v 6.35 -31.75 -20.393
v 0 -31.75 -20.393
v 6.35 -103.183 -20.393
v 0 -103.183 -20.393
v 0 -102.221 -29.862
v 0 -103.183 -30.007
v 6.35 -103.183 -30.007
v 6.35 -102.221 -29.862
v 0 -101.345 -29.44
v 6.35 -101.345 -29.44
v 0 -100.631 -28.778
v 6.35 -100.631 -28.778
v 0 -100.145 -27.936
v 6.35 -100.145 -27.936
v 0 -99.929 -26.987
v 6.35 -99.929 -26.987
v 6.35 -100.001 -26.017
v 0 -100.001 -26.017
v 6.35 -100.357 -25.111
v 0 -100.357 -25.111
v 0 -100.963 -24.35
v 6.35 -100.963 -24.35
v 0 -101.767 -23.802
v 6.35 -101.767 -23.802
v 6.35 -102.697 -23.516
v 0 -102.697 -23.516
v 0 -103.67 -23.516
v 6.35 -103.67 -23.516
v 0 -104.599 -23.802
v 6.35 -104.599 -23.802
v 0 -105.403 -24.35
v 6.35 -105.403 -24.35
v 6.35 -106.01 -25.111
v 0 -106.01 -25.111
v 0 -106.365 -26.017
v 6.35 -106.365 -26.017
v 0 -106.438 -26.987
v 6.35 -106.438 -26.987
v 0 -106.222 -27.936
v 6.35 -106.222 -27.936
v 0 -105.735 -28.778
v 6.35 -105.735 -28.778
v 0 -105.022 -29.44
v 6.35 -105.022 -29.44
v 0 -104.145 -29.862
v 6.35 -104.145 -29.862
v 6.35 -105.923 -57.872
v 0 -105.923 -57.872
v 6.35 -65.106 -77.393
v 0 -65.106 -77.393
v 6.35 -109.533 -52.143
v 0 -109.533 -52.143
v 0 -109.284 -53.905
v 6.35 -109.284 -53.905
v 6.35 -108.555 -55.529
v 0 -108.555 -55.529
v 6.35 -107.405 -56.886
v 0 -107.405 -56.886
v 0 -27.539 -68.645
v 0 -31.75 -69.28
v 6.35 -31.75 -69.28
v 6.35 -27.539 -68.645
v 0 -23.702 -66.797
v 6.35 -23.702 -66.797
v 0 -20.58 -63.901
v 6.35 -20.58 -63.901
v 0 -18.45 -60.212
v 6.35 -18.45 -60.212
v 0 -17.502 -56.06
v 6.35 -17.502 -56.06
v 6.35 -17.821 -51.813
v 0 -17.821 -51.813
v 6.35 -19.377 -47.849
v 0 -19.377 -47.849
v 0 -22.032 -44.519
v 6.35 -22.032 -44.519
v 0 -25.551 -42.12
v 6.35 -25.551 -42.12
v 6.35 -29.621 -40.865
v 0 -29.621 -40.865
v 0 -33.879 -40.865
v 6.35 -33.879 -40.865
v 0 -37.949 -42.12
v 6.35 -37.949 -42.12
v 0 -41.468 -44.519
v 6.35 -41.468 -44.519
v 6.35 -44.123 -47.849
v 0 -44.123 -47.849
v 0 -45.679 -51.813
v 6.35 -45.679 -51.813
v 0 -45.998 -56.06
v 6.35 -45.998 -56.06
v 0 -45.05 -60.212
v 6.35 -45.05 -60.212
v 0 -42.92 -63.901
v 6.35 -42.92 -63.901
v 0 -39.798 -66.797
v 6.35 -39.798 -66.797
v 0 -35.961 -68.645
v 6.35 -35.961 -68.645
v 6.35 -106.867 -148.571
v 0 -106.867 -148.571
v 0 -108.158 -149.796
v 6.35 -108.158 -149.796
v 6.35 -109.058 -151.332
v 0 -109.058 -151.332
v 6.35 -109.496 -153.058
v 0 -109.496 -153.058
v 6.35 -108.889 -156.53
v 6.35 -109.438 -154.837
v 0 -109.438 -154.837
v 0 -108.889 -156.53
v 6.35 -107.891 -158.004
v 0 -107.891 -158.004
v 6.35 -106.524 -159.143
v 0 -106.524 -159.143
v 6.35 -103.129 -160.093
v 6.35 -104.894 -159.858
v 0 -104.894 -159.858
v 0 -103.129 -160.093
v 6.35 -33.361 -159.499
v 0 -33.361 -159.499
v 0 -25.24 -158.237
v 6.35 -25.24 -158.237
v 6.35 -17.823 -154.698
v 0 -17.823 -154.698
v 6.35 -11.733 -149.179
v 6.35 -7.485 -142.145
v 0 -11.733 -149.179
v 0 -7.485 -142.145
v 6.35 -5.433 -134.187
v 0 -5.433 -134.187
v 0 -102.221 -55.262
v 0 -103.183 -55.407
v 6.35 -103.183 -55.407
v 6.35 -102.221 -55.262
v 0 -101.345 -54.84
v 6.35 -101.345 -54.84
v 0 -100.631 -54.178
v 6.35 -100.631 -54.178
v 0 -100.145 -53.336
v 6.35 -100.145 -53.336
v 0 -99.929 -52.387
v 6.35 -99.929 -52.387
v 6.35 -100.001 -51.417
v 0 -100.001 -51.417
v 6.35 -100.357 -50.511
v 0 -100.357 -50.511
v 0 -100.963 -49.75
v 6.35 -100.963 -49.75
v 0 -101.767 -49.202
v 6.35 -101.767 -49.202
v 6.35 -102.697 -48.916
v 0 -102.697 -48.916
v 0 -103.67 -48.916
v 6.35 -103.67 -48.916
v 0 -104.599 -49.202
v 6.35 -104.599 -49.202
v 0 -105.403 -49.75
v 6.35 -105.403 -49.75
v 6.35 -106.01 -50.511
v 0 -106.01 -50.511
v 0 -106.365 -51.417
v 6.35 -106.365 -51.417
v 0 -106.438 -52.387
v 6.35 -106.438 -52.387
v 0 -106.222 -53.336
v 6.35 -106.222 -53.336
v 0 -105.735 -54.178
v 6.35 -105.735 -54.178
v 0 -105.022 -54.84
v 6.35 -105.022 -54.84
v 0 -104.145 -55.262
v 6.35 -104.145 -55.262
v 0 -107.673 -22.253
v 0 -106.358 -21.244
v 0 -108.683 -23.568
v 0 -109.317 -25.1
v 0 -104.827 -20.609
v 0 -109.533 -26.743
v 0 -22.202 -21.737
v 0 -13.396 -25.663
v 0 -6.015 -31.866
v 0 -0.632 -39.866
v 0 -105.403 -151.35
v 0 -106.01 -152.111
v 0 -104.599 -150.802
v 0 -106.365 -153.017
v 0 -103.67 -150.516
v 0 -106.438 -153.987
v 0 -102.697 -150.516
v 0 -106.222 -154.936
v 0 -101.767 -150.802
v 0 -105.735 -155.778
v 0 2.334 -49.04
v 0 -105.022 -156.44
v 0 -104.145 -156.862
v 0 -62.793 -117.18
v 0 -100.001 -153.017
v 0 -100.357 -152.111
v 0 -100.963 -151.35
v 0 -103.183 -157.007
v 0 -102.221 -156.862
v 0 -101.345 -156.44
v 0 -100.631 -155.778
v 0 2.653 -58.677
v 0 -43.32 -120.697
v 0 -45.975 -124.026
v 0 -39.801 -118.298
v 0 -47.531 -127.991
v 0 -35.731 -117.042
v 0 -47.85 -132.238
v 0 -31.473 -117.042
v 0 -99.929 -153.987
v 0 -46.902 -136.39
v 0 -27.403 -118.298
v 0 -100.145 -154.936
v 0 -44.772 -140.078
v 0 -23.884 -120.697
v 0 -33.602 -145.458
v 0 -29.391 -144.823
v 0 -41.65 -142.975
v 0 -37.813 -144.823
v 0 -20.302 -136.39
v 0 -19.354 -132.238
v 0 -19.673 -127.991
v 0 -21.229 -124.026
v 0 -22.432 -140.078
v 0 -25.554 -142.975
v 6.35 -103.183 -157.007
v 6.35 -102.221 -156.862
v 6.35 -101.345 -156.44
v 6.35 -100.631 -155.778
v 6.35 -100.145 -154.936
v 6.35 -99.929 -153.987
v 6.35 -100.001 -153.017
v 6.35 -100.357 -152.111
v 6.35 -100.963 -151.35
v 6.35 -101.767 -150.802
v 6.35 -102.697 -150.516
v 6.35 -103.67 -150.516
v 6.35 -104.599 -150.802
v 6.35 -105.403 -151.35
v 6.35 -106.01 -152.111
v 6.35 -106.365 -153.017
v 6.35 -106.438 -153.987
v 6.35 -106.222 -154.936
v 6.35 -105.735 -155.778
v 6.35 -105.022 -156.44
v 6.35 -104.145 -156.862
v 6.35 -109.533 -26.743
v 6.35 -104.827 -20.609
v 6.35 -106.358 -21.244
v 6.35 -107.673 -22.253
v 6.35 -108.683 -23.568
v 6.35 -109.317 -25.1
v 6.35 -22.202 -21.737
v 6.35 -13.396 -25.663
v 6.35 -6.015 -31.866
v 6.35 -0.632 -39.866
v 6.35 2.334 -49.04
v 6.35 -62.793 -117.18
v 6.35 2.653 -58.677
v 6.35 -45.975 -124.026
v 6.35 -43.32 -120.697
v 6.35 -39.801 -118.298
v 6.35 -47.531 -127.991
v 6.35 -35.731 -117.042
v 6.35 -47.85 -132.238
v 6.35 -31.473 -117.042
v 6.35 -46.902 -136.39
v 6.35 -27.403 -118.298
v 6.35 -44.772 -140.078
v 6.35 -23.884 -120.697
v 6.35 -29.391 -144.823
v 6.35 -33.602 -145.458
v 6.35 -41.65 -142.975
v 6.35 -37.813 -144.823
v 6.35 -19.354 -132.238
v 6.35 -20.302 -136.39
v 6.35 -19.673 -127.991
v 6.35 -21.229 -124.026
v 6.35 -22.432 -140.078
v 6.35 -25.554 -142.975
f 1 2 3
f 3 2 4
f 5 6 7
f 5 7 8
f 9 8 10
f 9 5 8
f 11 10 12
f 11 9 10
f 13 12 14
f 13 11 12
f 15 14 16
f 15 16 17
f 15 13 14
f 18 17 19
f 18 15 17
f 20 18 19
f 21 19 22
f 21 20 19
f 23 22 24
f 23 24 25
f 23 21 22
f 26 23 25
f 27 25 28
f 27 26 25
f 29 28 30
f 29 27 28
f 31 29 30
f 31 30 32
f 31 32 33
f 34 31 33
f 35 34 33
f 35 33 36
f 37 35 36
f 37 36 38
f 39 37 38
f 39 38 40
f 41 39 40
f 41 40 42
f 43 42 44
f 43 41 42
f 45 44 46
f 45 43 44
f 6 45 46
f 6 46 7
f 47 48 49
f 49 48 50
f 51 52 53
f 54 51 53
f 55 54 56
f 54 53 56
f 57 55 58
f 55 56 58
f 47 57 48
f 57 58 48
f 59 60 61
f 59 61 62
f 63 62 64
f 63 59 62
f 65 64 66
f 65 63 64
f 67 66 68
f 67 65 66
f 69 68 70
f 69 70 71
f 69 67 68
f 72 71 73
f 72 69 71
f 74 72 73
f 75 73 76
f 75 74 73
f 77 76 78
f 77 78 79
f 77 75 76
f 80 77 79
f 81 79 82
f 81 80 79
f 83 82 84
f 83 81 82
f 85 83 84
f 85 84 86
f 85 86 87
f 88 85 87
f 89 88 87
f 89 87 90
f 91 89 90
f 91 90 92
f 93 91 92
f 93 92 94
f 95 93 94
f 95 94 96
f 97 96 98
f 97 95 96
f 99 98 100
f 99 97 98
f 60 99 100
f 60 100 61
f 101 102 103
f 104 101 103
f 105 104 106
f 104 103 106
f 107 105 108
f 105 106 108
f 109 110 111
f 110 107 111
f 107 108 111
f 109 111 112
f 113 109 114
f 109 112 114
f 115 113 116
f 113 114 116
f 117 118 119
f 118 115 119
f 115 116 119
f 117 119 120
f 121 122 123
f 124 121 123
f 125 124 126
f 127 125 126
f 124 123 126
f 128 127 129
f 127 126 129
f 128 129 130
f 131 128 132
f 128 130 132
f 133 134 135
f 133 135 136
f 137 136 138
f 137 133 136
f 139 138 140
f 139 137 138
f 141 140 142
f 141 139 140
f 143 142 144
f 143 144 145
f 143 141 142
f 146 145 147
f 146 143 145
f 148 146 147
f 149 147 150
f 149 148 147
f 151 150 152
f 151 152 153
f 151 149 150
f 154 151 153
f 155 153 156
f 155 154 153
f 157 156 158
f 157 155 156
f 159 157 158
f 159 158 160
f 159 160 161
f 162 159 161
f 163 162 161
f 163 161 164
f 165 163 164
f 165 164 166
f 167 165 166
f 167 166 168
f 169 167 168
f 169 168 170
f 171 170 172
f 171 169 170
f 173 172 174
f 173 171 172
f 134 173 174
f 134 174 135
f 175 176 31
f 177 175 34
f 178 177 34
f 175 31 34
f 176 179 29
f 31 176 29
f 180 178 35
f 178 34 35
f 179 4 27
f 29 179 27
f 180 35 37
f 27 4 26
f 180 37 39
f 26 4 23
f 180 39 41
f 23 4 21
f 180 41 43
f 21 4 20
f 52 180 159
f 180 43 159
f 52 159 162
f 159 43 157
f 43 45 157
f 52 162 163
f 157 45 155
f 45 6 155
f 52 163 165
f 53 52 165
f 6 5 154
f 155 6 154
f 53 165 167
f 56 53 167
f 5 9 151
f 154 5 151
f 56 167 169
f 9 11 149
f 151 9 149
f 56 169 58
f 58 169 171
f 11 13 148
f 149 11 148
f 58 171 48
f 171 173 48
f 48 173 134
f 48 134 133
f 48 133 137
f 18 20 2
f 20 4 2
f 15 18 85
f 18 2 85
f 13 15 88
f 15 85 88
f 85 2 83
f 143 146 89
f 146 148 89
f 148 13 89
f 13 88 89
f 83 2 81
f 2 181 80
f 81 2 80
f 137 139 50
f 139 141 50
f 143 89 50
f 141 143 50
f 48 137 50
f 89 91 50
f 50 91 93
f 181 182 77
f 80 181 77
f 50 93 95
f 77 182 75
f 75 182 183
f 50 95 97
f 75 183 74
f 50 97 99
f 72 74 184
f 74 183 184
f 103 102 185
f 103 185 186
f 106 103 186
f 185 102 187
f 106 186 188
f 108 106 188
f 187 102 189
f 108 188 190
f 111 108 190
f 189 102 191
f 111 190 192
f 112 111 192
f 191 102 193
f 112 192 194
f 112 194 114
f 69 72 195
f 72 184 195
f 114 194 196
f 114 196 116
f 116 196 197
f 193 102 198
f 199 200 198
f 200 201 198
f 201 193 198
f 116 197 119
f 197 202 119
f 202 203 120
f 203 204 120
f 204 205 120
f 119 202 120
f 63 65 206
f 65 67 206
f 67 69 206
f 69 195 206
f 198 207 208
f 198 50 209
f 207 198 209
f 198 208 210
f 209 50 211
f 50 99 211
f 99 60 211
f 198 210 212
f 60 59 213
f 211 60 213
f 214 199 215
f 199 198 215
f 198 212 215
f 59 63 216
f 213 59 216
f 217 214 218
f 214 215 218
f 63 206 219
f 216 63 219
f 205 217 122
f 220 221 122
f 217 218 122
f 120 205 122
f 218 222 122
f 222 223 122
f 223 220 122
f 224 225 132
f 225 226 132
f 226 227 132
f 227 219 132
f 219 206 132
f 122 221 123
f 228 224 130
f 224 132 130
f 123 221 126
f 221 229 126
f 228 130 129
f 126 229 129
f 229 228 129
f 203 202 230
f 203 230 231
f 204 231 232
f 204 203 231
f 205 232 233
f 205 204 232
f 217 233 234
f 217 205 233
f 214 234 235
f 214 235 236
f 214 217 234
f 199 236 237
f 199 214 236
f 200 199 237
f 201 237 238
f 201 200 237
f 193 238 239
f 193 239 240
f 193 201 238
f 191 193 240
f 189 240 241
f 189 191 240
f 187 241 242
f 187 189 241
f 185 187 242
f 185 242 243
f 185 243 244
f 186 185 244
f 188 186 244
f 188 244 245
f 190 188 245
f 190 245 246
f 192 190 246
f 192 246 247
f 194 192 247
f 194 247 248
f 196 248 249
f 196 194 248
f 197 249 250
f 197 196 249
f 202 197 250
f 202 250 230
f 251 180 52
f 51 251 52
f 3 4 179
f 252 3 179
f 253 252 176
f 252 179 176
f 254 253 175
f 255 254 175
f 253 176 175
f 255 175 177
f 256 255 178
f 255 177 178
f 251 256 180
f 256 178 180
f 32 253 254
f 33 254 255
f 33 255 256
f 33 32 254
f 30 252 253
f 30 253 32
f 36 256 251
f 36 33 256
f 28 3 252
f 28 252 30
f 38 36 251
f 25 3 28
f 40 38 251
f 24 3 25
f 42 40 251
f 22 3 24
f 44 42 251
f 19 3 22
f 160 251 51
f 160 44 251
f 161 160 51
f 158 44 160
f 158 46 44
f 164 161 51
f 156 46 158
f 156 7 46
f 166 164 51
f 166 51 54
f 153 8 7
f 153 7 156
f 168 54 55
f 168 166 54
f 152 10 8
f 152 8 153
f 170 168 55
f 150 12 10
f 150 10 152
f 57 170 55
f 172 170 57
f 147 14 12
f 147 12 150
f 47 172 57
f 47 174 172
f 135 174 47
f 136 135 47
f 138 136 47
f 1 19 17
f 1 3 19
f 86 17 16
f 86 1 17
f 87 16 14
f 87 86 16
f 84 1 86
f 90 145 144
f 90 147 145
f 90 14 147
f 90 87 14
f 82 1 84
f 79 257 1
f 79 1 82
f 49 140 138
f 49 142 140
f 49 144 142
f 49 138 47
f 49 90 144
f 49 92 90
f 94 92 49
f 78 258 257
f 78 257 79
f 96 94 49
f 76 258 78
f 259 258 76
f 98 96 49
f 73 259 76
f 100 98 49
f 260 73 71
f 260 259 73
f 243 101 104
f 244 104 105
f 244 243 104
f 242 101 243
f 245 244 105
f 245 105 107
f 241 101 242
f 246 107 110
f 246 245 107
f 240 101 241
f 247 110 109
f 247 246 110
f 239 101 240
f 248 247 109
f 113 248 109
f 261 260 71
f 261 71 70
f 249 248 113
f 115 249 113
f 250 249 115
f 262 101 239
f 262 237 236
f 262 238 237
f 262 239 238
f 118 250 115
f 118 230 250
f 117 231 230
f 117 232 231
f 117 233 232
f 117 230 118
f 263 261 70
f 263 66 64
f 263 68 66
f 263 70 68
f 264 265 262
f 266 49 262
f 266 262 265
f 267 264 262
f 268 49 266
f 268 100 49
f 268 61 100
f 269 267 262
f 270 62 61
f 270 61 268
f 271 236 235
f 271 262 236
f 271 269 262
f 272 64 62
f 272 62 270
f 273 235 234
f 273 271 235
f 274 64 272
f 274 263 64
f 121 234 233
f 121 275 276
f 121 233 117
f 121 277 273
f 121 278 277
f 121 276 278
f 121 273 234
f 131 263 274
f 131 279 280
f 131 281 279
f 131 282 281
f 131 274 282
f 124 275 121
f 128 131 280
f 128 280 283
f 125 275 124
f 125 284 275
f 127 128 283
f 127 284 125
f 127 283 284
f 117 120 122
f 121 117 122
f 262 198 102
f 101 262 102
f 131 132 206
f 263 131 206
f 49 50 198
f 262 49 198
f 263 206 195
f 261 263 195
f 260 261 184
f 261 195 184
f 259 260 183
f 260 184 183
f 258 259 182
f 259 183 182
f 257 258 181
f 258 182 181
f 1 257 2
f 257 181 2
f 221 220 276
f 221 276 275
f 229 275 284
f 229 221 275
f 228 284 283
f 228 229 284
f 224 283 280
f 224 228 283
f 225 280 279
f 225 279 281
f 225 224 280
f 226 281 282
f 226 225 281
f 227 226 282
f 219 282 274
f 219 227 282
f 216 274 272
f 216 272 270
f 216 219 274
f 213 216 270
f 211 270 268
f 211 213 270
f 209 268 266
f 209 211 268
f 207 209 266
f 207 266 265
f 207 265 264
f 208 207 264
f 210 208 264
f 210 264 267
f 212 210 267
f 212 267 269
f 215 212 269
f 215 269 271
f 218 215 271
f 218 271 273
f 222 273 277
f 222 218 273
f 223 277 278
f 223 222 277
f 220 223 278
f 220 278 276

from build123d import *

# Parameters (mm, degrees)
SKETCH2_R           = 34.599541738
SKETCH2_R_2         = 14.2875
SKETCH2_R_3         = 6.35
SKETCH2_R_4         = 3.2639
SKETCH2_R_5         = 28.329529504
BOSS_EXTRUDE2_DEPTH = 6.35


with BuildPart() as part:
    # Sketch2 → Boss-Extrude2 (new body)
    # profile 1 of 10: a face of its own
    with BuildSketch(Plane(origin=(0, 0, 0), x_dir=(0, 0, -1), z_dir=(1, 0, 0))):
        with Locations((54.99261314, -31.75)):
            Circle(SKETCH2_R)
        with Locations((54.99261314, -31.75)):
            Circle(SKETCH2_R_2, mode=Mode.SUBTRACT)
    # profile 2 of 10: a face of its own
    with BuildSketch(Plane(origin=(0, 0, 0), x_dir=(0, 0, -1), z_dir=(1, 0, 0))):
        with BuildLine():
            ThreePointArc((57.000696707, -66.291220141), (31.247618749, -56.915522641), (20.393071403, -31.75))
            Line((20.393071403, -31.75), (20.393071403, -103.183274949))
            ThreePointArc((20.393071403, -103.183274949), (26.743071403, -96.833274949), (33.093071403, -103.183274949))
            ThreePointArc((33.093071403, -103.183274949), (31.233199463, -107.67340301), (26.743071403, -109.533274949))
            Line((26.743071403, -109.533274949), (52.143071403, -109.533274949))
            ThreePointArc((52.143071403, -109.533274949), (47.652943342, -98.693146889), (58.493071403, -103.183274949))
            ThreePointArc((58.493071403, -103.183274949), (58.33576166, -104.587941235), (57.87162656, -105.923011398))
            Line((57.87162656, -105.923011398), (77.392896244, -65.105702067))
            Line((77.392896244, -65.105702067), (57.000696707, -66.291220141))
        make_face()
    # profile 3 of 10: a face of its own
    with BuildSketch(Plane(origin=(0, 0, 0), x_dir=(0, 0, -1), z_dir=(1, 0, 0))):
        with Locations((52.143071403, -103.183274949)):
            Circle(SKETCH2_R_3)
        with Locations((52.143071403, -103.183274949)):
            Circle(SKETCH2_R_4, mode=Mode.SUBTRACT)
    # profile 4 of 10: a face of its own
    with BuildSketch(Plane(origin=(0, 0, 0), x_dir=(0, 0, -1), z_dir=(1, 0, 0))):
        with Locations((26.743071403, -103.183274949)):
            Circle(SKETCH2_R_3)
        with Locations((26.743071403, -103.183274949)):
            Circle(SKETCH2_R_4, mode=Mode.SUBTRACT)
    # profile 5 of 10: a face of its own
    with BuildSketch(Plane(origin=(0, 0, 0), x_dir=(0, 0, -1), z_dir=(1, 0, 0))):
        with Locations((131.170104981, -33.601954858)):
            Circle(SKETCH2_R_5)
        with Locations((131.170104981, -33.601954858)):
            Circle(SKETCH2_R_2, mode=Mode.SUBTRACT)
    # profile 6 of 10: a face of its own
    with BuildSketch(Plane(origin=(0, 0, 0), x_dir=(0, 0, -1), z_dir=(1, 0, 0))):
        with BuildLine():
            Line((134.186655208, -5.433485487), (58.676799121, 2.652835088))
            ThreePointArc((58.676799121, 2.652835088), (80.727797568, -8.623639047), (89.592154878, -31.75))
            ThreePointArc((89.592154878, -31.75), (88.735013932, -39.403670834), (86.206059323, -46.678130018))
            Line((86.206059323, -46.678130018), (77.392896244, -65.105702067))
            Line((77.392896244, -65.105702067), (117.180043235, -62.792642027))
            Line((117.180043235, -62.792642027), (108.094917525, -50.036612316))
            ThreePointArc((108.094917525, -50.036612316), (106.717150914, -19.297575132), (134.186655208, -5.433485487))
        make_face()
    # profile 7 of 10: a face of its own
    with BuildSketch(Plane(origin=(0, 0, 0), x_dir=(0, 0, -1), z_dir=(1, 0, 0))):
        with BuildLine():
            ThreePointArc((86.206059323, -46.678130018), (74.282139722, -60.47355223), (57.000696707, -66.291220141))
            Line((57.000696707, -66.291220141), (77.392896244, -65.105702067))
            Line((77.392896244, -65.105702067), (86.206059323, -46.678130018))
        make_face()
    # profile 8 of 10: a face of its own
    with BuildSketch(Plane(origin=(0, 0, 0), x_dir=(0, 0, -1), z_dir=(1, 0, 0))):
        with BuildLine():
            ThreePointArc((132.814290418, -61.883731609), (118.926309787, -59.149004025), (108.094917525, -50.036612316))
            Line((108.094917525, -50.036612316), (117.180043235, -62.792642027))
            Line((117.180043235, -62.792642027), (132.814290418, -61.883731609))
        make_face()
    # profile 9 of 10: a face of its own
    with BuildSketch(Plane(origin=(0, 0, 0), x_dir=(0, 0, -1), z_dir=(1, 0, 0))):
        with BuildLine():
            Line((160.092841091, -103.129192537), (159.498606986, -33.360674656))
            ThreePointArc((159.498606986, -33.360674656), (159.49937761, -33.481313663), (159.499634486, -33.601954858))
            ThreePointArc((159.499634486, -33.601954858), (151.775216505, -53.043961468), (132.814290418, -61.883731609))
            Line((132.814290418, -61.883731609), (117.180043235, -62.792642027))
            Line((117.180043235, -62.792642027), (148.570820295, -106.867066268))
            ThreePointArc((148.570820295, -106.867066268), (151.78359124, -97.143164231), (160.092841091, -103.129192537))
        make_face()
    # profile 10 of 10: a face of its own
    with BuildSketch(Plane(origin=(0, 0, 0), x_dir=(0, 0, -1), z_dir=(1, 0, 0))):
        with Locations((153.743071403, -103.183274949)):
            Circle(SKETCH2_R_3)
        with Locations((153.743071403, -103.183274949)):
            Circle(SKETCH2_R_4, mode=Mode.SUBTRACT)
    extrude(amount=BOSS_EXTRUDE2_DEPTH)


solid = part.part
